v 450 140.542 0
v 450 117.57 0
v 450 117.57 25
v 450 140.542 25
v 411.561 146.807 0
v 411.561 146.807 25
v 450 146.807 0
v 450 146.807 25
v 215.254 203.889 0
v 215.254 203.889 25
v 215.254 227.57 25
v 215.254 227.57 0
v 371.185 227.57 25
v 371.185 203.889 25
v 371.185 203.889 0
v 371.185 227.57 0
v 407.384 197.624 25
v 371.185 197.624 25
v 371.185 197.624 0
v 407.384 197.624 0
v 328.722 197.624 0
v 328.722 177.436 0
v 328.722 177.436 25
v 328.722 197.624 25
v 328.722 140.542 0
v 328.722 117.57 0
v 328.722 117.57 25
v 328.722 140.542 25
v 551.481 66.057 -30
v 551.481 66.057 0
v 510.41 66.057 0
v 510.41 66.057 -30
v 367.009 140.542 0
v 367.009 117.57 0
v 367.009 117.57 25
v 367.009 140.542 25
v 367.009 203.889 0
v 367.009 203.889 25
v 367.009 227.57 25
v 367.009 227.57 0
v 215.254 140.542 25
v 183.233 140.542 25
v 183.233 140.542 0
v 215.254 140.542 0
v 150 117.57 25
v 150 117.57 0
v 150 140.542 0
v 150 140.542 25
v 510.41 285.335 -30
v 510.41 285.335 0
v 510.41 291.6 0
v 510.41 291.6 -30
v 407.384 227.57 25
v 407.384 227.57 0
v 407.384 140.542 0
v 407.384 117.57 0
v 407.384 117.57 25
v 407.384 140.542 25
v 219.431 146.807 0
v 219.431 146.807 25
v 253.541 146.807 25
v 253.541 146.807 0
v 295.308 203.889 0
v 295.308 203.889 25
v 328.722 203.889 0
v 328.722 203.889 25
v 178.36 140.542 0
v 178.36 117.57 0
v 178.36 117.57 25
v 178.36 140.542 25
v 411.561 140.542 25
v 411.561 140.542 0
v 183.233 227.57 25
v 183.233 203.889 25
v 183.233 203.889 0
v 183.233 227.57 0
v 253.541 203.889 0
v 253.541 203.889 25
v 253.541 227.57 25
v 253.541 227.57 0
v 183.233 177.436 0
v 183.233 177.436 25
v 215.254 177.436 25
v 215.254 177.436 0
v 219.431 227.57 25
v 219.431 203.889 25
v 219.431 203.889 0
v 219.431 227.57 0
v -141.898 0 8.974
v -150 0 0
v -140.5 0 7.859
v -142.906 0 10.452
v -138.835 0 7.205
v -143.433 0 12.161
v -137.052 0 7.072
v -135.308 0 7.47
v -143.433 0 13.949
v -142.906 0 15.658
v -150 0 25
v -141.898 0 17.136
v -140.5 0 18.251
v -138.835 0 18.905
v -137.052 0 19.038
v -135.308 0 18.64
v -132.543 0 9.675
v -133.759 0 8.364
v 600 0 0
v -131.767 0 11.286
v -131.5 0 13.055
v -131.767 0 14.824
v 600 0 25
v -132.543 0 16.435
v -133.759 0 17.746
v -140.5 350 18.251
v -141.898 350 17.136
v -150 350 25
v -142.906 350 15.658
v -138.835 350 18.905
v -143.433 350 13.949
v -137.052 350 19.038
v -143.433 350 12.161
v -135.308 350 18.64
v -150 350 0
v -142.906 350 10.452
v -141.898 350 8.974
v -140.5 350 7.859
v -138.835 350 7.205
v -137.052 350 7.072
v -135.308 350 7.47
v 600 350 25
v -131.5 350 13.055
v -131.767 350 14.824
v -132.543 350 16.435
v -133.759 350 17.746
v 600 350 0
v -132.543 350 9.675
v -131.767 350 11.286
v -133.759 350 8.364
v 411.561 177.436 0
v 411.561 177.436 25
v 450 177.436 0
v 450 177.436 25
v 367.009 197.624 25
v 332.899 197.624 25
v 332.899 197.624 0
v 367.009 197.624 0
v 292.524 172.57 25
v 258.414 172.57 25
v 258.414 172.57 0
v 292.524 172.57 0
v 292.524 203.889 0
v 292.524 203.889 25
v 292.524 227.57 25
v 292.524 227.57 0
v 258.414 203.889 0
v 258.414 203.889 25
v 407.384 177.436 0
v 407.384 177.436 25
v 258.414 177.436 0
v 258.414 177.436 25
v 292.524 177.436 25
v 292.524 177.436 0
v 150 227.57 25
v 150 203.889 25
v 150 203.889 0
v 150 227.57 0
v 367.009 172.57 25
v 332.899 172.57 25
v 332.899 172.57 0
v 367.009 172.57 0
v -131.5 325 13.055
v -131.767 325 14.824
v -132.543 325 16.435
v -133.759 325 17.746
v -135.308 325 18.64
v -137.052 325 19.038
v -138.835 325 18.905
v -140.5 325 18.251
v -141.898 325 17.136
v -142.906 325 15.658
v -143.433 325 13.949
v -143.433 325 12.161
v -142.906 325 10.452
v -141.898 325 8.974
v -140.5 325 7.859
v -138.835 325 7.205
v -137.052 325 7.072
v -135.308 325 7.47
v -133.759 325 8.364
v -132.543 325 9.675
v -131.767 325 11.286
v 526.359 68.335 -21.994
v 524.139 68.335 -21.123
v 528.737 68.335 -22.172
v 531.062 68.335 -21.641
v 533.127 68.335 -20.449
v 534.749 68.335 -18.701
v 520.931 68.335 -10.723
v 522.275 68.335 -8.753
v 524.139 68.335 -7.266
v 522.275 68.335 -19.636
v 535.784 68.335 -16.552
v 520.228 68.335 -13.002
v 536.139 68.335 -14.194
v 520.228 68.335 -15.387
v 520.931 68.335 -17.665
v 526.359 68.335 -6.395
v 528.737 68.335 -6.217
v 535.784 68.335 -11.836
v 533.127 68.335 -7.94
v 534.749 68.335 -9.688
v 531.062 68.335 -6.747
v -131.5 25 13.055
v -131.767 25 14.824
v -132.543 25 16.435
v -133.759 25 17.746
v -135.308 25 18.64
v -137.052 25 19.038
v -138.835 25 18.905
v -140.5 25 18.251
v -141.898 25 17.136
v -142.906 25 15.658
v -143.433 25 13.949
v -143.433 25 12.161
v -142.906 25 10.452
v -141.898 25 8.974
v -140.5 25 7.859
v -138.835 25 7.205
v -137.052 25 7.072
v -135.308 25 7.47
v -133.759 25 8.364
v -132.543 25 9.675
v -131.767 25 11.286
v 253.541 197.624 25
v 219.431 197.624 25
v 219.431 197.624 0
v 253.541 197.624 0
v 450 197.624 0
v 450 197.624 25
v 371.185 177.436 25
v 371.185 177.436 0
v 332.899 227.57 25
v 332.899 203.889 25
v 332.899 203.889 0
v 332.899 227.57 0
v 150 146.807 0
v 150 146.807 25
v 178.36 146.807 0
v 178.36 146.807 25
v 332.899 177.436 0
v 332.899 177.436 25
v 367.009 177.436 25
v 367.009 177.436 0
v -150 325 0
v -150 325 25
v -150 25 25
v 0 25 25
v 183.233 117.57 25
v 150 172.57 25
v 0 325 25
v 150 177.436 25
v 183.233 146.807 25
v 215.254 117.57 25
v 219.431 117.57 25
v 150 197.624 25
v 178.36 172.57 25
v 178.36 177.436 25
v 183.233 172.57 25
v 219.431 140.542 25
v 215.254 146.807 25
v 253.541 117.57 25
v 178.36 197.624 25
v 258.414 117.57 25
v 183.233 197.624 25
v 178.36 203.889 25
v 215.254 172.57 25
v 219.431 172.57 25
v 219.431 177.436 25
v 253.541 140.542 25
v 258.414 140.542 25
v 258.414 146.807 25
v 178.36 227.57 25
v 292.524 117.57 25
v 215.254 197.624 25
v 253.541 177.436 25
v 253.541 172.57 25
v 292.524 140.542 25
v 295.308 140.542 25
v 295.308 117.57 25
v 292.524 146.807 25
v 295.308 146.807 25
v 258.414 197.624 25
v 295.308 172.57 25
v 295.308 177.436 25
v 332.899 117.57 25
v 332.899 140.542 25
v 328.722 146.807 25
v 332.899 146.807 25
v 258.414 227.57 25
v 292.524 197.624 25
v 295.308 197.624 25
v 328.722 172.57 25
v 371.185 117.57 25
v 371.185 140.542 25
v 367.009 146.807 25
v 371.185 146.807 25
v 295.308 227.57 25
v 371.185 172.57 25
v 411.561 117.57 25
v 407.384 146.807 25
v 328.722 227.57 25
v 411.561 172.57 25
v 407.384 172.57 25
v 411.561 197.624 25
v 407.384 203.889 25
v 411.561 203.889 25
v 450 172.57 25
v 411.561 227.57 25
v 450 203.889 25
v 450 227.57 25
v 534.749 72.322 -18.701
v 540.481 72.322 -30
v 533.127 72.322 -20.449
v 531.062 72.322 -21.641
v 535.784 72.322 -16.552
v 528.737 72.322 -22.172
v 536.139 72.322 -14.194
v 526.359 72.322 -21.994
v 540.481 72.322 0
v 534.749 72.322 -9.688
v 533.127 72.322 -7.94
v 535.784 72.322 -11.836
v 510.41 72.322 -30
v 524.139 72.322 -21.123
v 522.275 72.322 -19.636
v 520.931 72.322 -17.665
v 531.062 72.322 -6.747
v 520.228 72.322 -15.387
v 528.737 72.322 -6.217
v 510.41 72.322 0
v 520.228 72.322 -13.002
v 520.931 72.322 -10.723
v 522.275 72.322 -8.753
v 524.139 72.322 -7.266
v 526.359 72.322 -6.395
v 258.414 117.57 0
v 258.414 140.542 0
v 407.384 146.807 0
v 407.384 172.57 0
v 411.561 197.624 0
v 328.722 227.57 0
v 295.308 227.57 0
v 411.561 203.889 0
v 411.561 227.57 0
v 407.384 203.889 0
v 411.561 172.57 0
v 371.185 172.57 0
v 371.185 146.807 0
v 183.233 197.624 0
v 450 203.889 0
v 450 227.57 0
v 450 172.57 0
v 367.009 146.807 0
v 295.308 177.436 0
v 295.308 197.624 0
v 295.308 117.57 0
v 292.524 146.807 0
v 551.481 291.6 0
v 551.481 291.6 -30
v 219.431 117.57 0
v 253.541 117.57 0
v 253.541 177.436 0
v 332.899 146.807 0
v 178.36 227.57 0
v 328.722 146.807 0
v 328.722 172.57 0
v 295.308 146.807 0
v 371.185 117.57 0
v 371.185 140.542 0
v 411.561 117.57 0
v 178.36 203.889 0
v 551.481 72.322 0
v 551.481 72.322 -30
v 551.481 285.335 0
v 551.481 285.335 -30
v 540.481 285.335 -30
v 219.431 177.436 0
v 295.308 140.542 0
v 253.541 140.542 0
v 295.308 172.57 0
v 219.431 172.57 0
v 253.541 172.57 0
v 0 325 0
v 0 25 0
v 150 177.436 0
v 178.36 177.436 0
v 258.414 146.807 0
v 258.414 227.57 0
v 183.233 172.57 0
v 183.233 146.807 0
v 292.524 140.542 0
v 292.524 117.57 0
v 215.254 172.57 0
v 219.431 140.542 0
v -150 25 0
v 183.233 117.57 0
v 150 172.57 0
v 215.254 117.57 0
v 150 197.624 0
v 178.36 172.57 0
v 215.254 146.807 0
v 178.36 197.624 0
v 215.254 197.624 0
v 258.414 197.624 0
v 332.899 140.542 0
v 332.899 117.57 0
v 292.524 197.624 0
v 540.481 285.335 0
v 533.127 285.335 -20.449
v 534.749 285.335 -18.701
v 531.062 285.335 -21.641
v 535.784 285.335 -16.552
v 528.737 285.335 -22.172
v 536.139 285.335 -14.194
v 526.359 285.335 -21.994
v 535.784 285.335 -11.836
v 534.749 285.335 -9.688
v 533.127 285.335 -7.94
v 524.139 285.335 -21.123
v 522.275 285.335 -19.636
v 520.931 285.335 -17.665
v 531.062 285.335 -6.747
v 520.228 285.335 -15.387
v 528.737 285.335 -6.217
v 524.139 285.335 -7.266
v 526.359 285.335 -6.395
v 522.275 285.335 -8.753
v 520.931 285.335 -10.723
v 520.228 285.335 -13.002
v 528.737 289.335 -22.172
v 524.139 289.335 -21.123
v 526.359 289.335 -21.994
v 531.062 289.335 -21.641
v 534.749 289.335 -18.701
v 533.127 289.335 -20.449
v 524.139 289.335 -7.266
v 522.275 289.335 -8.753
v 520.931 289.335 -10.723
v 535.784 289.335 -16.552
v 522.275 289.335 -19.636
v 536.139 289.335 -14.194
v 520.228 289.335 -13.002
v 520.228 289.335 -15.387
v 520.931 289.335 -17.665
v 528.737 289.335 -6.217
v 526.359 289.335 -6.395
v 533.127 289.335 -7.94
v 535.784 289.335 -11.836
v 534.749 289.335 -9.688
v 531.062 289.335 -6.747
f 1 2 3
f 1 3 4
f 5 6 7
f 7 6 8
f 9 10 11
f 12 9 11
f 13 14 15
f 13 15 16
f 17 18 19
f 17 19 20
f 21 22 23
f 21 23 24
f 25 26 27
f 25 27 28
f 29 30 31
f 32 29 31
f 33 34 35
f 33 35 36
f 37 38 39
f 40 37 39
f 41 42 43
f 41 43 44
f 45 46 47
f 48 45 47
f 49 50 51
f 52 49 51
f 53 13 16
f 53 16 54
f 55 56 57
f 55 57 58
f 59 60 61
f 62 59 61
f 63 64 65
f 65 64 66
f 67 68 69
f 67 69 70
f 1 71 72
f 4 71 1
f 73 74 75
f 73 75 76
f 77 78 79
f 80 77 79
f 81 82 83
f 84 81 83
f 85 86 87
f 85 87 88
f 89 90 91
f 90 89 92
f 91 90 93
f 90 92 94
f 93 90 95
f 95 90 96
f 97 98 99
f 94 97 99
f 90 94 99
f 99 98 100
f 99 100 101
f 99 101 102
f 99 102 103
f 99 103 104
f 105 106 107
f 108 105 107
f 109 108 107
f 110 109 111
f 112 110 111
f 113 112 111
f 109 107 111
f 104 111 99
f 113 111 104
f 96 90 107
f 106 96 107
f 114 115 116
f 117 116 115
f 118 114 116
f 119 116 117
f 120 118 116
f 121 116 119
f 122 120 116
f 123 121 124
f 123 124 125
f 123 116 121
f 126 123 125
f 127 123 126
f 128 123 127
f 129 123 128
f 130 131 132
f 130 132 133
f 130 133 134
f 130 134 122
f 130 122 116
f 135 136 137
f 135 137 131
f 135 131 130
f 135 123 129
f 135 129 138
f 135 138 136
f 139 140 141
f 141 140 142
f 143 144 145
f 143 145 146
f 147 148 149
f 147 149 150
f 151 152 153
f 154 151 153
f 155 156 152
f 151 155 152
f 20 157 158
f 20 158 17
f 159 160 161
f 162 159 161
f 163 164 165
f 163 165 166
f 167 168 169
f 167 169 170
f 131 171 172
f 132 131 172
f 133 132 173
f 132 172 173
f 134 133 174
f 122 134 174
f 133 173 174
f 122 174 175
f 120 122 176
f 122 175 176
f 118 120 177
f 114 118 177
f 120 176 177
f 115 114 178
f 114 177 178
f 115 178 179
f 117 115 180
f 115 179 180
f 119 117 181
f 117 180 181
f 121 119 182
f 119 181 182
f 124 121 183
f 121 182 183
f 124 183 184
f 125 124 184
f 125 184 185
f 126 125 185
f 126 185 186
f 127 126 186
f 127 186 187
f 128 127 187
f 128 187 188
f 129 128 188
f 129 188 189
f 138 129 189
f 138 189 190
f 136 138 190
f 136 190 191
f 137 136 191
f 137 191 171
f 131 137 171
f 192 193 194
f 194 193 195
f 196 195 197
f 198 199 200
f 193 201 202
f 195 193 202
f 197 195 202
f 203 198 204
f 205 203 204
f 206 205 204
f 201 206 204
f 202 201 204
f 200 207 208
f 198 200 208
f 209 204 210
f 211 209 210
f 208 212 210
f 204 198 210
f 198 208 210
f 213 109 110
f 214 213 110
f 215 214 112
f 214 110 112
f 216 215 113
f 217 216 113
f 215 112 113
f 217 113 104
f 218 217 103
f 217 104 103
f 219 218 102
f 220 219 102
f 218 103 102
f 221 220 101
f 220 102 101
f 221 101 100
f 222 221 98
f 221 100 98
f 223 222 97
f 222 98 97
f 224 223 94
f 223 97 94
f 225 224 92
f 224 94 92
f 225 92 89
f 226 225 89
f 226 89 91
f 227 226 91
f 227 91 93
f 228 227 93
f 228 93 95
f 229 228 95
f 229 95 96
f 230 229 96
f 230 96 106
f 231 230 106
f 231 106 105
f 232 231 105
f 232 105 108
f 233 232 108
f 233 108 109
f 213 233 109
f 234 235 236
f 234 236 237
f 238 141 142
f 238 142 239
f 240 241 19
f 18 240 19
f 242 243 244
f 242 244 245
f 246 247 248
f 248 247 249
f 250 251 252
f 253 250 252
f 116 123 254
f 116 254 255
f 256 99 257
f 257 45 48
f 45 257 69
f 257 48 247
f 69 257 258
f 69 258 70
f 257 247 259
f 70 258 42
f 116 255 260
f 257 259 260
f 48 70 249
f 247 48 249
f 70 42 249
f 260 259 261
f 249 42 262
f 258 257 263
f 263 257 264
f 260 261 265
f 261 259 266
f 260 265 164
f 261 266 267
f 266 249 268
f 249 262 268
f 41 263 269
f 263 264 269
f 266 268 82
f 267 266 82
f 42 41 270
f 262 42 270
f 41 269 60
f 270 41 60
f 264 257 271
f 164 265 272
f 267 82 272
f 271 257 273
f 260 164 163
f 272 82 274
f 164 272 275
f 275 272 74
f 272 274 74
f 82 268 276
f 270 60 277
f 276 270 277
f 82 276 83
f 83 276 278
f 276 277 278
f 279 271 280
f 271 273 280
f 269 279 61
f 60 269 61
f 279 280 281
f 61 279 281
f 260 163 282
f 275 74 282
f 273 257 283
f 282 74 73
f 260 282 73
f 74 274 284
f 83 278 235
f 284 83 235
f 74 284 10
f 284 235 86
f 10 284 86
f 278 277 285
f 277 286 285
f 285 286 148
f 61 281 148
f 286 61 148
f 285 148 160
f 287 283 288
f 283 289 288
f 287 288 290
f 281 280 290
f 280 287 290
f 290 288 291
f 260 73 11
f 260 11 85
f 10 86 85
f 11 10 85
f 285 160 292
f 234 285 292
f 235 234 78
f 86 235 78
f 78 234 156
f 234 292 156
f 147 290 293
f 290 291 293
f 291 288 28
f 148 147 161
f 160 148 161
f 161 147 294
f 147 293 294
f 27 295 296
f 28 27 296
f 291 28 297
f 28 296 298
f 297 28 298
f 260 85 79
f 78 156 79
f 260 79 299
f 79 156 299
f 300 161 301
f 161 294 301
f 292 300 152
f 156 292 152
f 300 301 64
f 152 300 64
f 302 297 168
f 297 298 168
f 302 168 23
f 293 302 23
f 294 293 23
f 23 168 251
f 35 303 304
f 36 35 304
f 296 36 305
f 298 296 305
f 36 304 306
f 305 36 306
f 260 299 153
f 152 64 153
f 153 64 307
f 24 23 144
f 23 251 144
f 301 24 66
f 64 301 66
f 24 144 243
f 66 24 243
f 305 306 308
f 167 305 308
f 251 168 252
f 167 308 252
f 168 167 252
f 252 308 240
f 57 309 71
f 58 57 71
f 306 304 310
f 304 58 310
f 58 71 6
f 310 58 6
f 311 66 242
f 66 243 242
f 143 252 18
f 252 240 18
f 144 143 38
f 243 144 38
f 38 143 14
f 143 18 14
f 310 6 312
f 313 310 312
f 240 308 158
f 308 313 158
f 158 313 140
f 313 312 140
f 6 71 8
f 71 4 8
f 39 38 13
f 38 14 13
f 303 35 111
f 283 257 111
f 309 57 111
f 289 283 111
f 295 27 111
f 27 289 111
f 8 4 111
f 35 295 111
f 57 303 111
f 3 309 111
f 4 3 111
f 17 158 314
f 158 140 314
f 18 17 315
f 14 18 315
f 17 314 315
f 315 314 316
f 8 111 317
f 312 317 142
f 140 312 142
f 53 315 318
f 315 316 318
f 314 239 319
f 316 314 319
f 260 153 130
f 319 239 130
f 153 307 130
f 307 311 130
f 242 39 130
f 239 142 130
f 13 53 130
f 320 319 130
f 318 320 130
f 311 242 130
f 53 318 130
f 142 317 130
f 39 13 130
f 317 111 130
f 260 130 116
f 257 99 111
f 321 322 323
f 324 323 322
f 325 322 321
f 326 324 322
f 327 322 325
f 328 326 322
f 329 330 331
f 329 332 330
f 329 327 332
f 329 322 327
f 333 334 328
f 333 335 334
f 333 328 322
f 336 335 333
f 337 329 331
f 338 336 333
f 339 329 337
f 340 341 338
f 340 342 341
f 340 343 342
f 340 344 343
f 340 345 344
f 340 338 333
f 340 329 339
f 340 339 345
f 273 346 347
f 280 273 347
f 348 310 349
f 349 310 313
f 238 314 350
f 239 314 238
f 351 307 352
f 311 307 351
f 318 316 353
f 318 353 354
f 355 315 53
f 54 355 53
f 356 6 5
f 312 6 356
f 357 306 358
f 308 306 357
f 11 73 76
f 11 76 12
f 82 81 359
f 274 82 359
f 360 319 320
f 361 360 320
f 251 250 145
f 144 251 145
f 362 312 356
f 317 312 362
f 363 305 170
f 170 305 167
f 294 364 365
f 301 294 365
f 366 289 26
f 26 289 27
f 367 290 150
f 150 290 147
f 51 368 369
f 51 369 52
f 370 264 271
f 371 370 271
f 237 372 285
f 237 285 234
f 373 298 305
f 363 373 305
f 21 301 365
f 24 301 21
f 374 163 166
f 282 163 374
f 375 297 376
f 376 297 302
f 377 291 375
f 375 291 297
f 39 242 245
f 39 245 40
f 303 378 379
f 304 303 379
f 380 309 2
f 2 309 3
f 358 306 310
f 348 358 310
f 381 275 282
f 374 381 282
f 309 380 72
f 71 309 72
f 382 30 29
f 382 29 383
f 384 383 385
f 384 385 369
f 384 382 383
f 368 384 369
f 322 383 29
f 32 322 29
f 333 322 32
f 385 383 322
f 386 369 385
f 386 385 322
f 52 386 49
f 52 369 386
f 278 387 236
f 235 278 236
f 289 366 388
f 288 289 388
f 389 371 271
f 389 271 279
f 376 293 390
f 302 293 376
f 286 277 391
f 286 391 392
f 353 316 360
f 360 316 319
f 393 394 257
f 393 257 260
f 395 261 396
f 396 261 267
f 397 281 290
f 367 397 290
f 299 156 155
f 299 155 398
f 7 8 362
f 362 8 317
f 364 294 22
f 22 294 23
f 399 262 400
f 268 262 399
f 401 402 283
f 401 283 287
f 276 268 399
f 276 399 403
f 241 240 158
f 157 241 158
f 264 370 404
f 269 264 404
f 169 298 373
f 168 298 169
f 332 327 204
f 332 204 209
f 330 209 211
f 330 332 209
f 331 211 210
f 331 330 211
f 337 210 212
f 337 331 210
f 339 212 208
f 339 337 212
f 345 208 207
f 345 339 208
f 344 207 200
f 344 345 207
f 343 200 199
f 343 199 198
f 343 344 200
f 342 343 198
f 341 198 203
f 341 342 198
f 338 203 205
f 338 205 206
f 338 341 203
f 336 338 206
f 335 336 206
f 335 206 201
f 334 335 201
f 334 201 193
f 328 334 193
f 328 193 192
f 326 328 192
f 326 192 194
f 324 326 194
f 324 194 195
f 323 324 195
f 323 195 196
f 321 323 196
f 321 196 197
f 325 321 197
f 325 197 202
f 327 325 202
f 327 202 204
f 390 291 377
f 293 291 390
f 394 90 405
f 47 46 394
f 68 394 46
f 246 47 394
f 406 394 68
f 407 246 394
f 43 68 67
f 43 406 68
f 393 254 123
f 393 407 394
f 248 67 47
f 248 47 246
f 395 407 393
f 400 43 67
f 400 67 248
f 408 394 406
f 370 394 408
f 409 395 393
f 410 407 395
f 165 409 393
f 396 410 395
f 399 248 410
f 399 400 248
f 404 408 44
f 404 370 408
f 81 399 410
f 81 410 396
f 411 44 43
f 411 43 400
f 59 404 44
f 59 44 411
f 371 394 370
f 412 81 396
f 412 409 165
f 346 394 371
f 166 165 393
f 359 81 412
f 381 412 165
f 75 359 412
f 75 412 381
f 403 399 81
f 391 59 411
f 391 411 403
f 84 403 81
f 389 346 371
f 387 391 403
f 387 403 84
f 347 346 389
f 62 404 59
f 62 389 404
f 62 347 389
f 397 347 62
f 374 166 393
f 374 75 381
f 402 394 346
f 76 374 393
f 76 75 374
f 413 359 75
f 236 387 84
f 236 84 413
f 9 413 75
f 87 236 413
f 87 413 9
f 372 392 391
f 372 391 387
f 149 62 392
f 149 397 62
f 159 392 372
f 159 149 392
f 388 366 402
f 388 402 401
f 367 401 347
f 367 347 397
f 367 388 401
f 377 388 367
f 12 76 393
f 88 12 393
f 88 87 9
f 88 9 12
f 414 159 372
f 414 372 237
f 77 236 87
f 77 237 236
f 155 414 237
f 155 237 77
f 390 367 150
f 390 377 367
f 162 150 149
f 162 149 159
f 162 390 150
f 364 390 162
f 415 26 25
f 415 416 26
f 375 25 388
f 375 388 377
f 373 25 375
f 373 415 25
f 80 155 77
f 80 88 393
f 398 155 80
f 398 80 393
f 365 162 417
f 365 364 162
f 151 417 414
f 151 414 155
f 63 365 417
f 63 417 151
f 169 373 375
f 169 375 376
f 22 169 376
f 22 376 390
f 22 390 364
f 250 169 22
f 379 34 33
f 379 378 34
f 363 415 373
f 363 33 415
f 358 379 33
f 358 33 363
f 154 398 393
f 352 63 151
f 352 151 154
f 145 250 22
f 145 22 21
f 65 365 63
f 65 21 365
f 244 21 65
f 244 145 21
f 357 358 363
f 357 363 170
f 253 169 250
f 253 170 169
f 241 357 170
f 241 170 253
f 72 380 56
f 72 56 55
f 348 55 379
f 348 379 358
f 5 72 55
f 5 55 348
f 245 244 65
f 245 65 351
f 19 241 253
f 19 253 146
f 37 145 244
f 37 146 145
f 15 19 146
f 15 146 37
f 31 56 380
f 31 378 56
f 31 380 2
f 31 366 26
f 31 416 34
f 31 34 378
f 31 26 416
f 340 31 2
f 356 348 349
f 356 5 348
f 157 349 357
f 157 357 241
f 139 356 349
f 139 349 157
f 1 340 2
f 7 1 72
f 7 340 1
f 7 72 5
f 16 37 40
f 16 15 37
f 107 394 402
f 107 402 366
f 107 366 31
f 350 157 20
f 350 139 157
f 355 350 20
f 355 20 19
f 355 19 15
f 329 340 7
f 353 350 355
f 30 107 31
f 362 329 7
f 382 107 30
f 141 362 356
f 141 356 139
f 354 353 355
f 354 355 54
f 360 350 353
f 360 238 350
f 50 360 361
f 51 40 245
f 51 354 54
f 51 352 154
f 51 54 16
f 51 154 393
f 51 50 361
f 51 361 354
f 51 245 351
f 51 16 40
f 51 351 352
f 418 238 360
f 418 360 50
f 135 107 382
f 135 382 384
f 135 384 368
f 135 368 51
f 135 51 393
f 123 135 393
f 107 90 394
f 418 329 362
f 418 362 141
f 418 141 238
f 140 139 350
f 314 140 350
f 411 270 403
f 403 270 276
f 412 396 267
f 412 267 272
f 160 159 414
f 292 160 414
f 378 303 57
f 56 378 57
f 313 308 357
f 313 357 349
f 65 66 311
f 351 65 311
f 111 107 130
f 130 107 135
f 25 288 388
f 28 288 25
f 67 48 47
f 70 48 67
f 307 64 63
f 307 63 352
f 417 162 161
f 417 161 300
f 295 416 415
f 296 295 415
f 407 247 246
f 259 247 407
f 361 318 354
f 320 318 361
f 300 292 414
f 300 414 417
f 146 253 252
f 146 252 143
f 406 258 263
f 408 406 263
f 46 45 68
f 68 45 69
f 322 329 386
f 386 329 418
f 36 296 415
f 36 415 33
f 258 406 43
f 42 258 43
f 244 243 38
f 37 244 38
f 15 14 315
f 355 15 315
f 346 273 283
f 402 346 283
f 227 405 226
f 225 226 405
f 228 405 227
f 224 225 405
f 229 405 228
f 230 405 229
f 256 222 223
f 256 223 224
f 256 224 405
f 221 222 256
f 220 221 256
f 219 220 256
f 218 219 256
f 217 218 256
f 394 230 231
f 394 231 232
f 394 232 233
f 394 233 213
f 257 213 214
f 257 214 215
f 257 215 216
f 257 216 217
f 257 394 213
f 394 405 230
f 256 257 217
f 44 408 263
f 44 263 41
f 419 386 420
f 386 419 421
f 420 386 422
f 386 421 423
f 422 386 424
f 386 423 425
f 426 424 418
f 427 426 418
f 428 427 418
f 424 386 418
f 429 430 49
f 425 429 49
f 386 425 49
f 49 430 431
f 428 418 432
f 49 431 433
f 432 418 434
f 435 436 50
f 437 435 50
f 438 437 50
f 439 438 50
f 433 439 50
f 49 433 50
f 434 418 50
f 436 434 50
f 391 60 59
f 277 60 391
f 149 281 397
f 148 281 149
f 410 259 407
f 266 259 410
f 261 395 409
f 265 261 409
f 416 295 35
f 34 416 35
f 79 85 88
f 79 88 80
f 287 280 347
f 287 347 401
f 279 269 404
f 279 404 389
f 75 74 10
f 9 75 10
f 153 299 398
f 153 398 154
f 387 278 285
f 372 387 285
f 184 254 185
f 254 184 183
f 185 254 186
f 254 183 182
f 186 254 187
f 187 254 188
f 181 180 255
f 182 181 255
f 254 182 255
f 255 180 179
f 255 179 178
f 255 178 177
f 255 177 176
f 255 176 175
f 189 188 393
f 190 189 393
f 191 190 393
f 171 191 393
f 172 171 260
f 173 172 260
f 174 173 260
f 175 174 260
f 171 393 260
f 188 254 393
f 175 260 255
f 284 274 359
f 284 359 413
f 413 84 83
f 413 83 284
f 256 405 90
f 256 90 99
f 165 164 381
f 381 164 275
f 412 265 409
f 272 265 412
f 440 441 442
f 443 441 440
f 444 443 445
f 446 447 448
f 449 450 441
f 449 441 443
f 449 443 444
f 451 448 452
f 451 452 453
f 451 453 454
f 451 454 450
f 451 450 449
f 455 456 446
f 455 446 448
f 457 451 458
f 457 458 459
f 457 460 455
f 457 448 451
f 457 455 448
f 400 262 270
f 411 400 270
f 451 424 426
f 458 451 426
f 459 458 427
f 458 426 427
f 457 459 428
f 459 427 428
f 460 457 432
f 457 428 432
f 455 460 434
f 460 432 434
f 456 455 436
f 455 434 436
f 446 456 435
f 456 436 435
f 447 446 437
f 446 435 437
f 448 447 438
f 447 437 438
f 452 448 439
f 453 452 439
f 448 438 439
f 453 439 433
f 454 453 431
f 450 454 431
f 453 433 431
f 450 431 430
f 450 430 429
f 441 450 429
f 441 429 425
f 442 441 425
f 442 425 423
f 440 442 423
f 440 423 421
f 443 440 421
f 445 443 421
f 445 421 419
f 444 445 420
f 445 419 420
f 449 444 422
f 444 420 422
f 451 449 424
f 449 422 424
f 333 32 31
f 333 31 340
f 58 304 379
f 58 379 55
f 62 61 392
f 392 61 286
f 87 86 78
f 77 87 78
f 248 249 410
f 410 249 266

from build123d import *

# Parameters (mm, degrees)
SKETCH1_W               = 600
SKETCH1_H               = 350
BOSS_EXTRUDE1_DEPTH     = 25
SKETCH3_W               = 25
SKETCH3_H               = 25
BOSS_EXTRUDE2_DEPTH     = 150
SKETCH4_R               = 6
CUT_EXTRUDE1_DEPTH      = 370
SKETCH5_W               = 28.359872958
SKETCH5_H               = 23.680958907
SKETCH5_W_2             = 32.02157976
SKETCH5_W_3             = 34.109943658
SKETCH5_W_4             = 34.109943657
SKETCH5_W_5             = 33.413822358
SKETCH5_W_6             = 36.198307555
SKETCH5_W_7             = 38.439491831
SKETCH5_H_2             = 20.187517675
SKETCH5_H_3             = 25.762905436
SKETCH5_H_4             = 22.972002872
CUT_EXTRUDE3_DEPTH      = 30
SKETCH7_W               = 11
SKETCH7_H               = 213.013117536
BOSS_EXTRUDE4_DEPTH     = 30
SKETCH8_W               = 41.071156649
SKETCH8_H               = 6.265091692
BOSS_EXTRUDE5_DEPTH     = 30
SKETCH11_R              = 8
CUT_EXTRUDE6_DEPTH      = 217
CUT_EXTRUDE6_DEPTH_BACK = 4


with BuildPart() as part:
    # Sketch1 → Boss-Extrude1 (new body)
    with BuildSketch(Plane.XY):
        with Locations((300, 175)):
            Rectangle(SKETCH1_W, SKETCH1_H)
    extrude(amount=BOSS_EXTRUDE1_DEPTH)

    # Sketch3 → Boss-Extrude2 (add)
    with BuildSketch(Plane.ZY):
        with Locations((12.5, 12.5)):
            Rectangle(SKETCH3_W, SKETCH3_H)
        with Locations((12.5, 337.5)):
            Rectangle(SKETCH3_W, SKETCH3_H)
    extrude(amount=BOSS_EXTRUDE2_DEPTH)

    # Sketch4 → Cut-Extrude1 (cut)
    with BuildSketch(Plane.XZ):
        with Locations((-137.5, 13.055008402)):
            Circle(SKETCH4_R)
    extrude(amount=-CUT_EXTRUDE1_DEPTH, mode=Mode.SUBTRACT)

    # Sketch5 → Cut-Extrude3 (cut)
    with BuildSketch(Plane.XY.offset(25)):
        with Locations((164.179936479, 215.729513368)):
            Rectangle(SKETCH5_W, SKETCH5_H)
        with Locations((199.243511932, 215.729513368)):
            Rectangle(SKETCH5_W_2, SKETCH5_H)
        with Locations((236.486001436, 215.729513368)):
            Rectangle(SKETCH5_W_3, SKETCH5_H)
        with Locations((275.468794188, 215.729513368)):
            Rectangle(SKETCH5_W_4, SKETCH5_H)
        with Locations((312.015162392, 215.729513368)):
            Rectangle(SKETCH5_W_5, SKETCH5_H)
        with Locations((349.953773195, 215.729513368)):
            Rectangle(SKETCH5_W_3, SKETCH5_H)
        with Locations((389.284626597, 215.729513368)):
            Rectangle(SKETCH5_W_6, SKETCH5_H)
        with Locations((430.780254085, 215.729513368)):
            Rectangle(SKETCH5_W_7, SKETCH5_H)
        with Locations((164.179936479, 187.530183384)):
            Rectangle(SKETCH5_W, SKETCH5_H_2)
        with Locations((199.243511932, 187.530183384)):
            Rectangle(SKETCH5_W_2, SKETCH5_H_2)
        with Locations((236.486001436, 187.530183384)):
            Rectangle(SKETCH5_W_3, SKETCH5_H_2)
        with Locations((275.468794188, 187.530183384)):
            Rectangle(SKETCH5_W_4, SKETCH5_H_2)
        with Locations((312.015162392, 187.530183384)):
            Rectangle(SKETCH5_W_5, SKETCH5_H_2)
        with Locations((349.953773195, 187.530183384)):
            Rectangle(SKETCH5_W_3, SKETCH5_H_2)
        with Locations((389.284626597, 187.530183384)):
            Rectangle(SKETCH5_W_6, SKETCH5_H_2)
        with Locations((430.780254085, 187.530183384)):
            Rectangle(SKETCH5_W_7, SKETCH5_H_2)
        with Locations((430.780254085, 159.688540103)):
            Rectangle(SKETCH5_W_7, SKETCH5_H_3)
        with Locations((389.284626597, 159.688540103)):
            Rectangle(SKETCH5_W_6, SKETCH5_H_3)
        with Locations((349.953773195, 159.688540103)):
            Rectangle(SKETCH5_W_3, SKETCH5_H_3)
        with Locations((312.015162392, 159.688540103)):
            Rectangle(SKETCH5_W_5, SKETCH5_H_3)
        with Locations((275.468794188, 159.688540103)):
            Rectangle(SKETCH5_W_4, SKETCH5_H_3)
        with Locations((236.486001436, 159.688540103)):
            Rectangle(SKETCH5_W_3, SKETCH5_H_3)
        with Locations((199.243511932, 159.688540103)):
            Rectangle(SKETCH5_W_2, SKETCH5_H_3)
        with Locations((164.179936479, 159.688540103)):
            Rectangle(SKETCH5_W, SKETCH5_H_3)
        with Locations((164.179936479, 129.055994257)):
            Rectangle(SKETCH5_W, SKETCH5_H_4)
        with Locations((199.243511932, 129.055994257)):
            Rectangle(SKETCH5_W_2, SKETCH5_H_4)
        with Locations((236.486001436, 129.055994257)):
            Rectangle(SKETCH5_W_3, SKETCH5_H_4)
        with Locations((275.468794188, 129.055994257)):
            Rectangle(SKETCH5_W_4, SKETCH5_H_4)
        with Locations((312.015162392, 129.055994257)):
            Rectangle(SKETCH5_W_5, SKETCH5_H_4)
        with Locations((349.953773195, 129.055994257)):
            Rectangle(SKETCH5_W_3, SKETCH5_H_4)
        with Locations((389.284626597, 129.055994257)):
            Rectangle(SKETCH5_W_6, SKETCH5_H_4)
        with Locations((430.780254085, 129.055994257)):
            Rectangle(SKETCH5_W_7, SKETCH5_H_4)
    extrude(amount=-CUT_EXTRUDE3_DEPTH, mode=Mode.SUBTRACT)

    # Sketch7 → Boss-Extrude4 (add)
    with BuildSketch(Plane(origin=(0, 0, 0), x_dir=(-1, 0, 0), z_dir=(0, 0, -1))):
        with Locations((-545.980889295, 178.828667145)):
            Rectangle(SKETCH7_W, SKETCH7_H)
    extrude(amount=BOSS_EXTRUDE4_DEPTH)

    # Sketch8 → Boss-Extrude5 (add)
    with BuildSketch(Plane(origin=(0, 0, 0), x_dir=(-1, 0, 0), z_dir=(0, 0, -1))):
        with Locations((-530.945310971, 288.467771759)):
            Rectangle(SKETCH8_W, SKETCH8_H)
        with Locations((-530.945310971, 69.189562531)):
            Rectangle(SKETCH8_W, SKETCH8_H)
    extrude(amount=BOSS_EXTRUDE5_DEPTH)

    # Sketch11 → Cut-Extrude6 (cut, two sides)
    with BuildSketch(Plane.XZ.offset(-285.335225913)) as cut_extrude6_sk:
        with Locations((528.139054201, -14.194336347)):
            Circle(SKETCH11_R)
    extrude(amount=CUT_EXTRUDE6_DEPTH, mode=Mode.SUBTRACT)
    extrude(cut_extrude6_sk.sketch, amount=-CUT_EXTRUDE6_DEPTH_BACK, mode=Mode.SUBTRACT)


solid = part.part
